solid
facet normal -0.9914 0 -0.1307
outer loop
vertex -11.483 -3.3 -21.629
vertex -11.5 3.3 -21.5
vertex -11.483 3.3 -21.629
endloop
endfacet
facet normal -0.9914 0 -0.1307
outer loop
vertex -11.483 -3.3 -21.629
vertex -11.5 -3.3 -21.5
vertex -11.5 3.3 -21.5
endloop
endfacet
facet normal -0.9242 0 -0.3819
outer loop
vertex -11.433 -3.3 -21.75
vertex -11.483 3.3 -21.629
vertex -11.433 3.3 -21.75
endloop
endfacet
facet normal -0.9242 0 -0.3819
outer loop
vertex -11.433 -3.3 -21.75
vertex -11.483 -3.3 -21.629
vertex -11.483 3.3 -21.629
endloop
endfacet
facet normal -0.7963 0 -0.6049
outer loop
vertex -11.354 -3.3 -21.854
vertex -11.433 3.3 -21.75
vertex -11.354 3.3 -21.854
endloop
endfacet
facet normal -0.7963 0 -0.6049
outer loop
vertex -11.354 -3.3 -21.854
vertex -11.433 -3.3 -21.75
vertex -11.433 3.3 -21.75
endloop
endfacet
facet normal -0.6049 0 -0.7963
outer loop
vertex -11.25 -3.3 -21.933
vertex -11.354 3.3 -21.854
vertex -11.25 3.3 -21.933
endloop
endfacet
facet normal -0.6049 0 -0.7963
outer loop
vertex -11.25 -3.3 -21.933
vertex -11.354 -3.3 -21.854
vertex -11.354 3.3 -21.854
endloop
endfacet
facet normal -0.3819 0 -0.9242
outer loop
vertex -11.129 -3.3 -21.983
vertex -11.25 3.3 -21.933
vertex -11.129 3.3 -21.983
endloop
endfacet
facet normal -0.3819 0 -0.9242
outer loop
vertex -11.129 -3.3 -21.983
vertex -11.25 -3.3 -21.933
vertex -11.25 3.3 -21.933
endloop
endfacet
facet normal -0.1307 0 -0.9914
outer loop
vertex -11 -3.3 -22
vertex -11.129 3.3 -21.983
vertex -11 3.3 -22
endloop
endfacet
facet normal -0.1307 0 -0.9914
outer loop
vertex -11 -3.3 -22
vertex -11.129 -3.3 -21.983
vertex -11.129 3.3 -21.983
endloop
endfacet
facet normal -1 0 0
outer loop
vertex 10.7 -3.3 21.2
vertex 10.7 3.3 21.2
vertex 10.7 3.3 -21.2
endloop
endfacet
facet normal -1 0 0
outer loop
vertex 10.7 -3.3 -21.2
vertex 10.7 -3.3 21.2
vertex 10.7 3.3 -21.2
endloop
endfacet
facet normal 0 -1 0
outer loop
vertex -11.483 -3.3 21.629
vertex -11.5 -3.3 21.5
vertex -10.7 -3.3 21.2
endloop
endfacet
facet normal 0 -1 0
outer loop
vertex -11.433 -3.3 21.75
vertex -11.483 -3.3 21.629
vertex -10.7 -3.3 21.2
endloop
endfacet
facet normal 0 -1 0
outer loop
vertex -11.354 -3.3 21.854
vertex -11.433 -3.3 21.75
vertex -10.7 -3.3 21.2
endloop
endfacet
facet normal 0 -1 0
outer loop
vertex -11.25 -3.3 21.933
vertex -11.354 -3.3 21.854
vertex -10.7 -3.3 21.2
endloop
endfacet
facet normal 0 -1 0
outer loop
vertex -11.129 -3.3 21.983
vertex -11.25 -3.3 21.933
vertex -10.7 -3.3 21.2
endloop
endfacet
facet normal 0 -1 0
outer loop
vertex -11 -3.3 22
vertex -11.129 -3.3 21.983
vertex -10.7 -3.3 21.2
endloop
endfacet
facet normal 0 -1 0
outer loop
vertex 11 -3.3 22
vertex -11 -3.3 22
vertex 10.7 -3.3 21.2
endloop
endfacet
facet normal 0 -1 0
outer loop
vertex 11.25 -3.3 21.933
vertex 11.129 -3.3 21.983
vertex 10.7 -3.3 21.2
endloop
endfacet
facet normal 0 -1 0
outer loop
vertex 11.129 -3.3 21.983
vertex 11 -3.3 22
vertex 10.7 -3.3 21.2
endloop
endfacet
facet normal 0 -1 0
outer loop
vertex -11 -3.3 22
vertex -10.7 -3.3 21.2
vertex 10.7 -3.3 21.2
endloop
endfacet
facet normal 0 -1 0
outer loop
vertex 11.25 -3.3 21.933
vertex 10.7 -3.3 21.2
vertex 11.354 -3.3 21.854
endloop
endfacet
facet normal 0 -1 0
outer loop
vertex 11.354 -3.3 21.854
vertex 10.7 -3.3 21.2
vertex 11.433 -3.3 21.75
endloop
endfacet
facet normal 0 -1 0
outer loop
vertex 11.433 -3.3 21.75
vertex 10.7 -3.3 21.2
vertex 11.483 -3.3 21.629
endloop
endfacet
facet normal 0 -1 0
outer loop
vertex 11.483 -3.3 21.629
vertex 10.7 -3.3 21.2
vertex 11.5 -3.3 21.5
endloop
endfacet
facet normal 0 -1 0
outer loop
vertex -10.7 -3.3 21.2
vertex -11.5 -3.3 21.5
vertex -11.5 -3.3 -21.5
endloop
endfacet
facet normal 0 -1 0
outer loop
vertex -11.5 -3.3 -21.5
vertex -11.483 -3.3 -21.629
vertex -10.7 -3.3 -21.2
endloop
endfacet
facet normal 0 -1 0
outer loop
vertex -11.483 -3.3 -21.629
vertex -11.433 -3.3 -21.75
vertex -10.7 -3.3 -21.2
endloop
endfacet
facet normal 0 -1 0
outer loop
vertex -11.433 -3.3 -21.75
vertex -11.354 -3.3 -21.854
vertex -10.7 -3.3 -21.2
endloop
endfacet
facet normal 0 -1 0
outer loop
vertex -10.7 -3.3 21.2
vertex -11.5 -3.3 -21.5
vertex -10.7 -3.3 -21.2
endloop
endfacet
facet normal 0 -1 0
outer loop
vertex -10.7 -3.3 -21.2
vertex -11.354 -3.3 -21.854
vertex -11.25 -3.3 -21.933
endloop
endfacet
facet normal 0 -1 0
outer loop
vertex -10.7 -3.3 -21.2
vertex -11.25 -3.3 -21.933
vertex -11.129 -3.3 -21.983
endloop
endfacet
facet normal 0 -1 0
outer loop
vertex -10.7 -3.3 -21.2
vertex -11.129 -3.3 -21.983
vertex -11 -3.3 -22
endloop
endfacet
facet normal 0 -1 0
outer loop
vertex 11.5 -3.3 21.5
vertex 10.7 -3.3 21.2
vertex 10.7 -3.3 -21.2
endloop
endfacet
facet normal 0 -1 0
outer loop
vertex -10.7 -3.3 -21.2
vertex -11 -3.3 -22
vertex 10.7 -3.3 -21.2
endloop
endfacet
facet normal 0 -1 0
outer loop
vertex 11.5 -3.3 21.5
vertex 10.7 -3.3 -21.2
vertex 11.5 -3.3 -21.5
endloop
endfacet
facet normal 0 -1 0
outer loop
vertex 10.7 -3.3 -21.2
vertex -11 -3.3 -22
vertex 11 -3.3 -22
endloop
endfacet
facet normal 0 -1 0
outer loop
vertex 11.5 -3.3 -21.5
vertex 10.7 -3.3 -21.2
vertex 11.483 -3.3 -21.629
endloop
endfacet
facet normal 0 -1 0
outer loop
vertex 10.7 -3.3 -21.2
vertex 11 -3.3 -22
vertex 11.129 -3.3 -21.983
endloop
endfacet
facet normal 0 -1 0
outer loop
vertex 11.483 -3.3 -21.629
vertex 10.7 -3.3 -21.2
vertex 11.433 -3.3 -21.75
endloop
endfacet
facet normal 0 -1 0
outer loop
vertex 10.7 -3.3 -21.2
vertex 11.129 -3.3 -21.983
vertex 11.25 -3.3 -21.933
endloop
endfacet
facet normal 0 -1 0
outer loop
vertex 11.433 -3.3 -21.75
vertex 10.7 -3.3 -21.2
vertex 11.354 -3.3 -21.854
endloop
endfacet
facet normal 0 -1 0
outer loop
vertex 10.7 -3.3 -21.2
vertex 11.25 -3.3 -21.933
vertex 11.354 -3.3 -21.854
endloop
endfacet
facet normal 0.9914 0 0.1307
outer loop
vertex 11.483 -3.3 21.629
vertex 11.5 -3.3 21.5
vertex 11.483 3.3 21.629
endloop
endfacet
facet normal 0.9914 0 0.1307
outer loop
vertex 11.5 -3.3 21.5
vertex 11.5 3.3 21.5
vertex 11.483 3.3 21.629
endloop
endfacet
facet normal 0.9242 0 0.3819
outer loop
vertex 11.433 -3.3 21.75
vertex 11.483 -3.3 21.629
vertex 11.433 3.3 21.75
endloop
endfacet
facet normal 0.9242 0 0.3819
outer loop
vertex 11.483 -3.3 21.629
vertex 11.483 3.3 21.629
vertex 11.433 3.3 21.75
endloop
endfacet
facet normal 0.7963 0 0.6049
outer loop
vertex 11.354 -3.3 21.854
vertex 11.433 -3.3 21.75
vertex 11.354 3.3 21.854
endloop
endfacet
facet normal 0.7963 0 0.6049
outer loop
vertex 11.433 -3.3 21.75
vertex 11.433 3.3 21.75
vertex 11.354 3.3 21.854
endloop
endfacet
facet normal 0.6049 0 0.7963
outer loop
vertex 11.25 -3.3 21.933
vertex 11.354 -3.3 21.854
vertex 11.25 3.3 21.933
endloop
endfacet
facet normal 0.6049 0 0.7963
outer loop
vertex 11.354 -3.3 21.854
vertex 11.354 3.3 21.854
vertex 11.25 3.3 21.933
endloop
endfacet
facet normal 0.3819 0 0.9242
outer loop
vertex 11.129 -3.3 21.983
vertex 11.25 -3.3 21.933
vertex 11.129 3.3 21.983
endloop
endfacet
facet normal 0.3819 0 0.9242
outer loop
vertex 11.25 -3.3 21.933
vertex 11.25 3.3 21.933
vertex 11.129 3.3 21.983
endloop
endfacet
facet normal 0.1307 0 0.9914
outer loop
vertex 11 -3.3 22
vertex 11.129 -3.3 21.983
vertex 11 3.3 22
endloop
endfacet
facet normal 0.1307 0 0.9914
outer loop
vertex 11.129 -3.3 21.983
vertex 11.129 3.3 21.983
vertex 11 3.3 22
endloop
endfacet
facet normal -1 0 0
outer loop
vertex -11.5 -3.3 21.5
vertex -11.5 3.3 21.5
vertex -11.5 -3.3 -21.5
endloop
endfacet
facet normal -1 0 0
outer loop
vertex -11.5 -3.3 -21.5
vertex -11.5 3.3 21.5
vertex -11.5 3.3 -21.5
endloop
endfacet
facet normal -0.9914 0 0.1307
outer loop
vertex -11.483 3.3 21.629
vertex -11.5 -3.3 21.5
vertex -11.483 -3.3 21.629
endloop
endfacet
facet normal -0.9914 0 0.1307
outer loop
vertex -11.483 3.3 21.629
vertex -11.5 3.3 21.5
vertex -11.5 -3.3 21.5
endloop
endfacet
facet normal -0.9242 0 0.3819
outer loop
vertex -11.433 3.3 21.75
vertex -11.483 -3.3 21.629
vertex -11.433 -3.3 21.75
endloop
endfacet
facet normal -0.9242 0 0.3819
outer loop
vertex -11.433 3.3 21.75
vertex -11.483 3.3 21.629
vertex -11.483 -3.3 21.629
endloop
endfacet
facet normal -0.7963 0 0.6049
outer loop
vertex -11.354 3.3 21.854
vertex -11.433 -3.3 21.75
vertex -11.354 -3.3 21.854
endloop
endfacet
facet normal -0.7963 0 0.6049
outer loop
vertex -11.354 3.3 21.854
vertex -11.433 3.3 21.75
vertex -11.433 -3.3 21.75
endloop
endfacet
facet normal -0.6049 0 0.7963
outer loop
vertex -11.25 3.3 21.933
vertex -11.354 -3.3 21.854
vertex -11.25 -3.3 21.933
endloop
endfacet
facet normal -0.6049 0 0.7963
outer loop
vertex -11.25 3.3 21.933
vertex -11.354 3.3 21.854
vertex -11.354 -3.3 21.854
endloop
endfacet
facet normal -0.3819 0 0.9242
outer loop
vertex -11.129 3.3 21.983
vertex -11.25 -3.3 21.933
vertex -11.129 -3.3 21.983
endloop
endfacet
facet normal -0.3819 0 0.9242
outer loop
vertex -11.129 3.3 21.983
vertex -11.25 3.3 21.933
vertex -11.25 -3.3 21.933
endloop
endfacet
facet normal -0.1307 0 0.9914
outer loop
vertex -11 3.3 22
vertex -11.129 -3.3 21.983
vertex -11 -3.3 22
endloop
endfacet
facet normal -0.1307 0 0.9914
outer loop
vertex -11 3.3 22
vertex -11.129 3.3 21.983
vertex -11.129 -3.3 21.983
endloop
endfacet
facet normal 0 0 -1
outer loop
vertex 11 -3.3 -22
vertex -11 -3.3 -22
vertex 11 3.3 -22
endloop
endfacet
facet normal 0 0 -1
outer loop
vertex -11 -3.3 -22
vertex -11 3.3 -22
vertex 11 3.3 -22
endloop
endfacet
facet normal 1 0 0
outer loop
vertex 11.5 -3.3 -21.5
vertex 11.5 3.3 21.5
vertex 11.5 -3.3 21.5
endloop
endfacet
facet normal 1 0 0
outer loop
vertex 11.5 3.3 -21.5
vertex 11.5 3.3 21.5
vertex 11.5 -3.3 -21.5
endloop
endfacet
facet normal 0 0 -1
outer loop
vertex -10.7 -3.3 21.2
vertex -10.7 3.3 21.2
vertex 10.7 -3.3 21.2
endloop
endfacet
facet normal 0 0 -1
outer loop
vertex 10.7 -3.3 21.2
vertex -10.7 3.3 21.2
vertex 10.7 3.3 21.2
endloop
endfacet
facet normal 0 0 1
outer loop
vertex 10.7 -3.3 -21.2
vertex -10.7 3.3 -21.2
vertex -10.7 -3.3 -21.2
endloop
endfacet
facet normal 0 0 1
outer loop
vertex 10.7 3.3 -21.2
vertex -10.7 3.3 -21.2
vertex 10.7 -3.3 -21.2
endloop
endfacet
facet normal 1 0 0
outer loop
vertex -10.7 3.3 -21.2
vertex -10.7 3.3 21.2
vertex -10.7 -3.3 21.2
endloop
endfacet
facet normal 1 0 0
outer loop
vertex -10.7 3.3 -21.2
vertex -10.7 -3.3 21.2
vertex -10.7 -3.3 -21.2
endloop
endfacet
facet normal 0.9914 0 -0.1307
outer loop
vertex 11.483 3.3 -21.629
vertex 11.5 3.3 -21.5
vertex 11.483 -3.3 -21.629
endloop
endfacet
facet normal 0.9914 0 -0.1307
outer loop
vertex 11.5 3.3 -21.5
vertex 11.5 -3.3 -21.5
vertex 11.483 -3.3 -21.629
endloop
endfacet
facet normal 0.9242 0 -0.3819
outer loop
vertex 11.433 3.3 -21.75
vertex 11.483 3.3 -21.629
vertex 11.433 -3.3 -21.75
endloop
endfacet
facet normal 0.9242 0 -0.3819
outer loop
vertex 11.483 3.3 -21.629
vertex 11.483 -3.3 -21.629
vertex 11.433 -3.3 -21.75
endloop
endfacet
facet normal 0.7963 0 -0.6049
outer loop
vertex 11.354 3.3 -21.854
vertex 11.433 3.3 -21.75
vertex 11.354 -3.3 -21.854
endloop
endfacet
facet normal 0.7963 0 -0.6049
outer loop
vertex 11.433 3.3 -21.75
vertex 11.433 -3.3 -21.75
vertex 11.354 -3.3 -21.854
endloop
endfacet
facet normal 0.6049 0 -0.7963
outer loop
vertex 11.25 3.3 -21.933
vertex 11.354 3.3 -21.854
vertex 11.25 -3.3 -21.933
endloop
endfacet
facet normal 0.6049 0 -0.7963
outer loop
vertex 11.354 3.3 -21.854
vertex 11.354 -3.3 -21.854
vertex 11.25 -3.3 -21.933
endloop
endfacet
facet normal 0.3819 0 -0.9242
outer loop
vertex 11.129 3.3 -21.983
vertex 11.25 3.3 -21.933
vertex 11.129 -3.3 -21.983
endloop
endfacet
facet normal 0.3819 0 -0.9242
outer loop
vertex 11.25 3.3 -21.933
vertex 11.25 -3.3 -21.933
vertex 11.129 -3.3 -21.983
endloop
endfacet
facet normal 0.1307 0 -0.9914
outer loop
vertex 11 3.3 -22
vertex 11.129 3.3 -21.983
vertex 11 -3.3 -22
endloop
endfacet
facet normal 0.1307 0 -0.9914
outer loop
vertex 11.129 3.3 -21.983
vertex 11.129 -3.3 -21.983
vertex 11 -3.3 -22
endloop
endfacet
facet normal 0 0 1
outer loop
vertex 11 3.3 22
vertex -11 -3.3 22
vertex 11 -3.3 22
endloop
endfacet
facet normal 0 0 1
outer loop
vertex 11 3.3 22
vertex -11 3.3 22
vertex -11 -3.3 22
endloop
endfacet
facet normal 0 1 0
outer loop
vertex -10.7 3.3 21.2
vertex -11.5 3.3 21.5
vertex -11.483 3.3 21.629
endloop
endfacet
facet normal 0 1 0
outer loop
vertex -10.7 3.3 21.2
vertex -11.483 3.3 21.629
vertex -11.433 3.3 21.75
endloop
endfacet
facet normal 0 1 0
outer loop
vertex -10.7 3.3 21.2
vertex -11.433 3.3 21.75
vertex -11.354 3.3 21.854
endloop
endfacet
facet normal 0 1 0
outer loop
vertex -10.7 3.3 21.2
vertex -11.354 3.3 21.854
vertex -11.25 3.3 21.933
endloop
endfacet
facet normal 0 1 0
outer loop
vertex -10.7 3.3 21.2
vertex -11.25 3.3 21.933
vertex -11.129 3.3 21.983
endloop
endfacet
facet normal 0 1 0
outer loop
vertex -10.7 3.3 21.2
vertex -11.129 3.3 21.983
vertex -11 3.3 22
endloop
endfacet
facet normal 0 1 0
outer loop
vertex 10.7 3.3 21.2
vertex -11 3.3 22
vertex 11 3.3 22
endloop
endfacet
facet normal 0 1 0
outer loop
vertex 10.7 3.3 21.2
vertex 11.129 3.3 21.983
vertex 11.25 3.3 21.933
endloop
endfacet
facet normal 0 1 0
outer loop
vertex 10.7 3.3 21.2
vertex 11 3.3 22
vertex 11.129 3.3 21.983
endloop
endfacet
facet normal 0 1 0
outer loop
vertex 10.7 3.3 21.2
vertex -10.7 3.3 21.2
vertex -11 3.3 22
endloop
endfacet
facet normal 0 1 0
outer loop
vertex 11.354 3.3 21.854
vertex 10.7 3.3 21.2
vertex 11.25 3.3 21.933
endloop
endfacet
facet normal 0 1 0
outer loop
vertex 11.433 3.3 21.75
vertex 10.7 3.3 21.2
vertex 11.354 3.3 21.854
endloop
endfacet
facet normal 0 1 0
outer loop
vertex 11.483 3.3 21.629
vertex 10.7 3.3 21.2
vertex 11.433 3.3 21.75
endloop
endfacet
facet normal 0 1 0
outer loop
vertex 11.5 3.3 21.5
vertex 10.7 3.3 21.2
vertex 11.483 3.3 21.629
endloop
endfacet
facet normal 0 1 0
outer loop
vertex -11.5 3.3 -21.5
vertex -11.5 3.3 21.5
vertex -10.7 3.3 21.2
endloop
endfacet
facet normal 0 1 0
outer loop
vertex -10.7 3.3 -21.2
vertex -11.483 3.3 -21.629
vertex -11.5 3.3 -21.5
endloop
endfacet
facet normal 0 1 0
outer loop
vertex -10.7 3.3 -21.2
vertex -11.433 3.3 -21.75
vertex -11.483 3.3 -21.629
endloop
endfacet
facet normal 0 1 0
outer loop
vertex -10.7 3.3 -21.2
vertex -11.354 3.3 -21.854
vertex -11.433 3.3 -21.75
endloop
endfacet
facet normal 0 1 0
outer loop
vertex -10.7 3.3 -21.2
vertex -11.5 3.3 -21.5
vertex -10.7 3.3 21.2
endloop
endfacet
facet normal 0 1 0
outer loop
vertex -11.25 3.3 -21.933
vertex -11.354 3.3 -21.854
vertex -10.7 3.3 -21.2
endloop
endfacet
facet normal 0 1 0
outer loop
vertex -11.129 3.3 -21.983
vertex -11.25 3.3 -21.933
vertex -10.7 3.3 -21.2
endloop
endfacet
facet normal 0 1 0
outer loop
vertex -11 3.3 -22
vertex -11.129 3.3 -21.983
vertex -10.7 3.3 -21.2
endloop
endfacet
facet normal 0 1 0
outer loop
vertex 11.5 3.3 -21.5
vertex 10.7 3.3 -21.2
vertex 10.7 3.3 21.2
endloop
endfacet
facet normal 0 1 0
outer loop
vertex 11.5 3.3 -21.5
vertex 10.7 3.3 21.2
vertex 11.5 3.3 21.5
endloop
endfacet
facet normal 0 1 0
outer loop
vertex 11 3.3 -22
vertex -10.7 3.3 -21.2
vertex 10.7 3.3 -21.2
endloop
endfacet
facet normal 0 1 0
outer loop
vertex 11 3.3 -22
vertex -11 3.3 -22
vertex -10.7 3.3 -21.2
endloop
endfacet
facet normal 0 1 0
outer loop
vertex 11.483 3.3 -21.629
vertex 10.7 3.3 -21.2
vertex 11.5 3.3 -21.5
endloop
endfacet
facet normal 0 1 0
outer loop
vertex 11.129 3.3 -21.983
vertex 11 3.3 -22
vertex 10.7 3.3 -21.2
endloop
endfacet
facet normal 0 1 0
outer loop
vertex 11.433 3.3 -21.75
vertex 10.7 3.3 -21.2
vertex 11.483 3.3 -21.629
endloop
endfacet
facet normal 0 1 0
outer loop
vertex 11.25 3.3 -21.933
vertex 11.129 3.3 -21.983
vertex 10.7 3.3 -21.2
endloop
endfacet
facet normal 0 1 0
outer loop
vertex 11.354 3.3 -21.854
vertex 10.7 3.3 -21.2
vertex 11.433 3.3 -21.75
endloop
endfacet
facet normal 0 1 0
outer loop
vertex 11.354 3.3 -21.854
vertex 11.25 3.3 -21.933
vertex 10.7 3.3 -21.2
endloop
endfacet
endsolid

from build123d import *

# Parameters (mm, degrees)
BASES_W            = 23
BASES_H            = 44
BASE_DEPTH         = 3.3
BASE_F_R           = 0.5
POCKETS_W          = 21.4
POCKETS_H          = 42.4
CUT_EXTRUDE3_DEPTH = 26.686767021


with BuildPart() as part:
    # BaseS → BASE (new, symmetric)
    with BuildSketch(Plane(origin=(0, 0, 0), x_dir=(1, 0, 0), z_dir=(0, 1, 0))):
        Rectangle(BASES_W, BASES_H)
    extrude(amount=BASE_DEPTH, both=True)

    # BASE F
    base_f_edges = [part.edges().sort_by_distance(p)[0] for p in [
        (11.5, 0, 22),
        (-11.5, 0, 22),
        (-11.5, 0, -22),
        (11.5, 0, -22),
    ]]
    fillet(base_f_edges, radius=BASE_F_R)

    # PocketS → Cut-Extrude3 (cut, through all)
    with BuildSketch(Plane(origin=(0, 3.3, 0), x_dir=(1, 0, 0), z_dir=(0, 1, 0))):
        Rectangle(POCKETS_W, POCKETS_H)
    extrude(amount=-CUT_EXTRUDE3_DEPTH, mode=Mode.SUBTRACT)


solid = part.part
